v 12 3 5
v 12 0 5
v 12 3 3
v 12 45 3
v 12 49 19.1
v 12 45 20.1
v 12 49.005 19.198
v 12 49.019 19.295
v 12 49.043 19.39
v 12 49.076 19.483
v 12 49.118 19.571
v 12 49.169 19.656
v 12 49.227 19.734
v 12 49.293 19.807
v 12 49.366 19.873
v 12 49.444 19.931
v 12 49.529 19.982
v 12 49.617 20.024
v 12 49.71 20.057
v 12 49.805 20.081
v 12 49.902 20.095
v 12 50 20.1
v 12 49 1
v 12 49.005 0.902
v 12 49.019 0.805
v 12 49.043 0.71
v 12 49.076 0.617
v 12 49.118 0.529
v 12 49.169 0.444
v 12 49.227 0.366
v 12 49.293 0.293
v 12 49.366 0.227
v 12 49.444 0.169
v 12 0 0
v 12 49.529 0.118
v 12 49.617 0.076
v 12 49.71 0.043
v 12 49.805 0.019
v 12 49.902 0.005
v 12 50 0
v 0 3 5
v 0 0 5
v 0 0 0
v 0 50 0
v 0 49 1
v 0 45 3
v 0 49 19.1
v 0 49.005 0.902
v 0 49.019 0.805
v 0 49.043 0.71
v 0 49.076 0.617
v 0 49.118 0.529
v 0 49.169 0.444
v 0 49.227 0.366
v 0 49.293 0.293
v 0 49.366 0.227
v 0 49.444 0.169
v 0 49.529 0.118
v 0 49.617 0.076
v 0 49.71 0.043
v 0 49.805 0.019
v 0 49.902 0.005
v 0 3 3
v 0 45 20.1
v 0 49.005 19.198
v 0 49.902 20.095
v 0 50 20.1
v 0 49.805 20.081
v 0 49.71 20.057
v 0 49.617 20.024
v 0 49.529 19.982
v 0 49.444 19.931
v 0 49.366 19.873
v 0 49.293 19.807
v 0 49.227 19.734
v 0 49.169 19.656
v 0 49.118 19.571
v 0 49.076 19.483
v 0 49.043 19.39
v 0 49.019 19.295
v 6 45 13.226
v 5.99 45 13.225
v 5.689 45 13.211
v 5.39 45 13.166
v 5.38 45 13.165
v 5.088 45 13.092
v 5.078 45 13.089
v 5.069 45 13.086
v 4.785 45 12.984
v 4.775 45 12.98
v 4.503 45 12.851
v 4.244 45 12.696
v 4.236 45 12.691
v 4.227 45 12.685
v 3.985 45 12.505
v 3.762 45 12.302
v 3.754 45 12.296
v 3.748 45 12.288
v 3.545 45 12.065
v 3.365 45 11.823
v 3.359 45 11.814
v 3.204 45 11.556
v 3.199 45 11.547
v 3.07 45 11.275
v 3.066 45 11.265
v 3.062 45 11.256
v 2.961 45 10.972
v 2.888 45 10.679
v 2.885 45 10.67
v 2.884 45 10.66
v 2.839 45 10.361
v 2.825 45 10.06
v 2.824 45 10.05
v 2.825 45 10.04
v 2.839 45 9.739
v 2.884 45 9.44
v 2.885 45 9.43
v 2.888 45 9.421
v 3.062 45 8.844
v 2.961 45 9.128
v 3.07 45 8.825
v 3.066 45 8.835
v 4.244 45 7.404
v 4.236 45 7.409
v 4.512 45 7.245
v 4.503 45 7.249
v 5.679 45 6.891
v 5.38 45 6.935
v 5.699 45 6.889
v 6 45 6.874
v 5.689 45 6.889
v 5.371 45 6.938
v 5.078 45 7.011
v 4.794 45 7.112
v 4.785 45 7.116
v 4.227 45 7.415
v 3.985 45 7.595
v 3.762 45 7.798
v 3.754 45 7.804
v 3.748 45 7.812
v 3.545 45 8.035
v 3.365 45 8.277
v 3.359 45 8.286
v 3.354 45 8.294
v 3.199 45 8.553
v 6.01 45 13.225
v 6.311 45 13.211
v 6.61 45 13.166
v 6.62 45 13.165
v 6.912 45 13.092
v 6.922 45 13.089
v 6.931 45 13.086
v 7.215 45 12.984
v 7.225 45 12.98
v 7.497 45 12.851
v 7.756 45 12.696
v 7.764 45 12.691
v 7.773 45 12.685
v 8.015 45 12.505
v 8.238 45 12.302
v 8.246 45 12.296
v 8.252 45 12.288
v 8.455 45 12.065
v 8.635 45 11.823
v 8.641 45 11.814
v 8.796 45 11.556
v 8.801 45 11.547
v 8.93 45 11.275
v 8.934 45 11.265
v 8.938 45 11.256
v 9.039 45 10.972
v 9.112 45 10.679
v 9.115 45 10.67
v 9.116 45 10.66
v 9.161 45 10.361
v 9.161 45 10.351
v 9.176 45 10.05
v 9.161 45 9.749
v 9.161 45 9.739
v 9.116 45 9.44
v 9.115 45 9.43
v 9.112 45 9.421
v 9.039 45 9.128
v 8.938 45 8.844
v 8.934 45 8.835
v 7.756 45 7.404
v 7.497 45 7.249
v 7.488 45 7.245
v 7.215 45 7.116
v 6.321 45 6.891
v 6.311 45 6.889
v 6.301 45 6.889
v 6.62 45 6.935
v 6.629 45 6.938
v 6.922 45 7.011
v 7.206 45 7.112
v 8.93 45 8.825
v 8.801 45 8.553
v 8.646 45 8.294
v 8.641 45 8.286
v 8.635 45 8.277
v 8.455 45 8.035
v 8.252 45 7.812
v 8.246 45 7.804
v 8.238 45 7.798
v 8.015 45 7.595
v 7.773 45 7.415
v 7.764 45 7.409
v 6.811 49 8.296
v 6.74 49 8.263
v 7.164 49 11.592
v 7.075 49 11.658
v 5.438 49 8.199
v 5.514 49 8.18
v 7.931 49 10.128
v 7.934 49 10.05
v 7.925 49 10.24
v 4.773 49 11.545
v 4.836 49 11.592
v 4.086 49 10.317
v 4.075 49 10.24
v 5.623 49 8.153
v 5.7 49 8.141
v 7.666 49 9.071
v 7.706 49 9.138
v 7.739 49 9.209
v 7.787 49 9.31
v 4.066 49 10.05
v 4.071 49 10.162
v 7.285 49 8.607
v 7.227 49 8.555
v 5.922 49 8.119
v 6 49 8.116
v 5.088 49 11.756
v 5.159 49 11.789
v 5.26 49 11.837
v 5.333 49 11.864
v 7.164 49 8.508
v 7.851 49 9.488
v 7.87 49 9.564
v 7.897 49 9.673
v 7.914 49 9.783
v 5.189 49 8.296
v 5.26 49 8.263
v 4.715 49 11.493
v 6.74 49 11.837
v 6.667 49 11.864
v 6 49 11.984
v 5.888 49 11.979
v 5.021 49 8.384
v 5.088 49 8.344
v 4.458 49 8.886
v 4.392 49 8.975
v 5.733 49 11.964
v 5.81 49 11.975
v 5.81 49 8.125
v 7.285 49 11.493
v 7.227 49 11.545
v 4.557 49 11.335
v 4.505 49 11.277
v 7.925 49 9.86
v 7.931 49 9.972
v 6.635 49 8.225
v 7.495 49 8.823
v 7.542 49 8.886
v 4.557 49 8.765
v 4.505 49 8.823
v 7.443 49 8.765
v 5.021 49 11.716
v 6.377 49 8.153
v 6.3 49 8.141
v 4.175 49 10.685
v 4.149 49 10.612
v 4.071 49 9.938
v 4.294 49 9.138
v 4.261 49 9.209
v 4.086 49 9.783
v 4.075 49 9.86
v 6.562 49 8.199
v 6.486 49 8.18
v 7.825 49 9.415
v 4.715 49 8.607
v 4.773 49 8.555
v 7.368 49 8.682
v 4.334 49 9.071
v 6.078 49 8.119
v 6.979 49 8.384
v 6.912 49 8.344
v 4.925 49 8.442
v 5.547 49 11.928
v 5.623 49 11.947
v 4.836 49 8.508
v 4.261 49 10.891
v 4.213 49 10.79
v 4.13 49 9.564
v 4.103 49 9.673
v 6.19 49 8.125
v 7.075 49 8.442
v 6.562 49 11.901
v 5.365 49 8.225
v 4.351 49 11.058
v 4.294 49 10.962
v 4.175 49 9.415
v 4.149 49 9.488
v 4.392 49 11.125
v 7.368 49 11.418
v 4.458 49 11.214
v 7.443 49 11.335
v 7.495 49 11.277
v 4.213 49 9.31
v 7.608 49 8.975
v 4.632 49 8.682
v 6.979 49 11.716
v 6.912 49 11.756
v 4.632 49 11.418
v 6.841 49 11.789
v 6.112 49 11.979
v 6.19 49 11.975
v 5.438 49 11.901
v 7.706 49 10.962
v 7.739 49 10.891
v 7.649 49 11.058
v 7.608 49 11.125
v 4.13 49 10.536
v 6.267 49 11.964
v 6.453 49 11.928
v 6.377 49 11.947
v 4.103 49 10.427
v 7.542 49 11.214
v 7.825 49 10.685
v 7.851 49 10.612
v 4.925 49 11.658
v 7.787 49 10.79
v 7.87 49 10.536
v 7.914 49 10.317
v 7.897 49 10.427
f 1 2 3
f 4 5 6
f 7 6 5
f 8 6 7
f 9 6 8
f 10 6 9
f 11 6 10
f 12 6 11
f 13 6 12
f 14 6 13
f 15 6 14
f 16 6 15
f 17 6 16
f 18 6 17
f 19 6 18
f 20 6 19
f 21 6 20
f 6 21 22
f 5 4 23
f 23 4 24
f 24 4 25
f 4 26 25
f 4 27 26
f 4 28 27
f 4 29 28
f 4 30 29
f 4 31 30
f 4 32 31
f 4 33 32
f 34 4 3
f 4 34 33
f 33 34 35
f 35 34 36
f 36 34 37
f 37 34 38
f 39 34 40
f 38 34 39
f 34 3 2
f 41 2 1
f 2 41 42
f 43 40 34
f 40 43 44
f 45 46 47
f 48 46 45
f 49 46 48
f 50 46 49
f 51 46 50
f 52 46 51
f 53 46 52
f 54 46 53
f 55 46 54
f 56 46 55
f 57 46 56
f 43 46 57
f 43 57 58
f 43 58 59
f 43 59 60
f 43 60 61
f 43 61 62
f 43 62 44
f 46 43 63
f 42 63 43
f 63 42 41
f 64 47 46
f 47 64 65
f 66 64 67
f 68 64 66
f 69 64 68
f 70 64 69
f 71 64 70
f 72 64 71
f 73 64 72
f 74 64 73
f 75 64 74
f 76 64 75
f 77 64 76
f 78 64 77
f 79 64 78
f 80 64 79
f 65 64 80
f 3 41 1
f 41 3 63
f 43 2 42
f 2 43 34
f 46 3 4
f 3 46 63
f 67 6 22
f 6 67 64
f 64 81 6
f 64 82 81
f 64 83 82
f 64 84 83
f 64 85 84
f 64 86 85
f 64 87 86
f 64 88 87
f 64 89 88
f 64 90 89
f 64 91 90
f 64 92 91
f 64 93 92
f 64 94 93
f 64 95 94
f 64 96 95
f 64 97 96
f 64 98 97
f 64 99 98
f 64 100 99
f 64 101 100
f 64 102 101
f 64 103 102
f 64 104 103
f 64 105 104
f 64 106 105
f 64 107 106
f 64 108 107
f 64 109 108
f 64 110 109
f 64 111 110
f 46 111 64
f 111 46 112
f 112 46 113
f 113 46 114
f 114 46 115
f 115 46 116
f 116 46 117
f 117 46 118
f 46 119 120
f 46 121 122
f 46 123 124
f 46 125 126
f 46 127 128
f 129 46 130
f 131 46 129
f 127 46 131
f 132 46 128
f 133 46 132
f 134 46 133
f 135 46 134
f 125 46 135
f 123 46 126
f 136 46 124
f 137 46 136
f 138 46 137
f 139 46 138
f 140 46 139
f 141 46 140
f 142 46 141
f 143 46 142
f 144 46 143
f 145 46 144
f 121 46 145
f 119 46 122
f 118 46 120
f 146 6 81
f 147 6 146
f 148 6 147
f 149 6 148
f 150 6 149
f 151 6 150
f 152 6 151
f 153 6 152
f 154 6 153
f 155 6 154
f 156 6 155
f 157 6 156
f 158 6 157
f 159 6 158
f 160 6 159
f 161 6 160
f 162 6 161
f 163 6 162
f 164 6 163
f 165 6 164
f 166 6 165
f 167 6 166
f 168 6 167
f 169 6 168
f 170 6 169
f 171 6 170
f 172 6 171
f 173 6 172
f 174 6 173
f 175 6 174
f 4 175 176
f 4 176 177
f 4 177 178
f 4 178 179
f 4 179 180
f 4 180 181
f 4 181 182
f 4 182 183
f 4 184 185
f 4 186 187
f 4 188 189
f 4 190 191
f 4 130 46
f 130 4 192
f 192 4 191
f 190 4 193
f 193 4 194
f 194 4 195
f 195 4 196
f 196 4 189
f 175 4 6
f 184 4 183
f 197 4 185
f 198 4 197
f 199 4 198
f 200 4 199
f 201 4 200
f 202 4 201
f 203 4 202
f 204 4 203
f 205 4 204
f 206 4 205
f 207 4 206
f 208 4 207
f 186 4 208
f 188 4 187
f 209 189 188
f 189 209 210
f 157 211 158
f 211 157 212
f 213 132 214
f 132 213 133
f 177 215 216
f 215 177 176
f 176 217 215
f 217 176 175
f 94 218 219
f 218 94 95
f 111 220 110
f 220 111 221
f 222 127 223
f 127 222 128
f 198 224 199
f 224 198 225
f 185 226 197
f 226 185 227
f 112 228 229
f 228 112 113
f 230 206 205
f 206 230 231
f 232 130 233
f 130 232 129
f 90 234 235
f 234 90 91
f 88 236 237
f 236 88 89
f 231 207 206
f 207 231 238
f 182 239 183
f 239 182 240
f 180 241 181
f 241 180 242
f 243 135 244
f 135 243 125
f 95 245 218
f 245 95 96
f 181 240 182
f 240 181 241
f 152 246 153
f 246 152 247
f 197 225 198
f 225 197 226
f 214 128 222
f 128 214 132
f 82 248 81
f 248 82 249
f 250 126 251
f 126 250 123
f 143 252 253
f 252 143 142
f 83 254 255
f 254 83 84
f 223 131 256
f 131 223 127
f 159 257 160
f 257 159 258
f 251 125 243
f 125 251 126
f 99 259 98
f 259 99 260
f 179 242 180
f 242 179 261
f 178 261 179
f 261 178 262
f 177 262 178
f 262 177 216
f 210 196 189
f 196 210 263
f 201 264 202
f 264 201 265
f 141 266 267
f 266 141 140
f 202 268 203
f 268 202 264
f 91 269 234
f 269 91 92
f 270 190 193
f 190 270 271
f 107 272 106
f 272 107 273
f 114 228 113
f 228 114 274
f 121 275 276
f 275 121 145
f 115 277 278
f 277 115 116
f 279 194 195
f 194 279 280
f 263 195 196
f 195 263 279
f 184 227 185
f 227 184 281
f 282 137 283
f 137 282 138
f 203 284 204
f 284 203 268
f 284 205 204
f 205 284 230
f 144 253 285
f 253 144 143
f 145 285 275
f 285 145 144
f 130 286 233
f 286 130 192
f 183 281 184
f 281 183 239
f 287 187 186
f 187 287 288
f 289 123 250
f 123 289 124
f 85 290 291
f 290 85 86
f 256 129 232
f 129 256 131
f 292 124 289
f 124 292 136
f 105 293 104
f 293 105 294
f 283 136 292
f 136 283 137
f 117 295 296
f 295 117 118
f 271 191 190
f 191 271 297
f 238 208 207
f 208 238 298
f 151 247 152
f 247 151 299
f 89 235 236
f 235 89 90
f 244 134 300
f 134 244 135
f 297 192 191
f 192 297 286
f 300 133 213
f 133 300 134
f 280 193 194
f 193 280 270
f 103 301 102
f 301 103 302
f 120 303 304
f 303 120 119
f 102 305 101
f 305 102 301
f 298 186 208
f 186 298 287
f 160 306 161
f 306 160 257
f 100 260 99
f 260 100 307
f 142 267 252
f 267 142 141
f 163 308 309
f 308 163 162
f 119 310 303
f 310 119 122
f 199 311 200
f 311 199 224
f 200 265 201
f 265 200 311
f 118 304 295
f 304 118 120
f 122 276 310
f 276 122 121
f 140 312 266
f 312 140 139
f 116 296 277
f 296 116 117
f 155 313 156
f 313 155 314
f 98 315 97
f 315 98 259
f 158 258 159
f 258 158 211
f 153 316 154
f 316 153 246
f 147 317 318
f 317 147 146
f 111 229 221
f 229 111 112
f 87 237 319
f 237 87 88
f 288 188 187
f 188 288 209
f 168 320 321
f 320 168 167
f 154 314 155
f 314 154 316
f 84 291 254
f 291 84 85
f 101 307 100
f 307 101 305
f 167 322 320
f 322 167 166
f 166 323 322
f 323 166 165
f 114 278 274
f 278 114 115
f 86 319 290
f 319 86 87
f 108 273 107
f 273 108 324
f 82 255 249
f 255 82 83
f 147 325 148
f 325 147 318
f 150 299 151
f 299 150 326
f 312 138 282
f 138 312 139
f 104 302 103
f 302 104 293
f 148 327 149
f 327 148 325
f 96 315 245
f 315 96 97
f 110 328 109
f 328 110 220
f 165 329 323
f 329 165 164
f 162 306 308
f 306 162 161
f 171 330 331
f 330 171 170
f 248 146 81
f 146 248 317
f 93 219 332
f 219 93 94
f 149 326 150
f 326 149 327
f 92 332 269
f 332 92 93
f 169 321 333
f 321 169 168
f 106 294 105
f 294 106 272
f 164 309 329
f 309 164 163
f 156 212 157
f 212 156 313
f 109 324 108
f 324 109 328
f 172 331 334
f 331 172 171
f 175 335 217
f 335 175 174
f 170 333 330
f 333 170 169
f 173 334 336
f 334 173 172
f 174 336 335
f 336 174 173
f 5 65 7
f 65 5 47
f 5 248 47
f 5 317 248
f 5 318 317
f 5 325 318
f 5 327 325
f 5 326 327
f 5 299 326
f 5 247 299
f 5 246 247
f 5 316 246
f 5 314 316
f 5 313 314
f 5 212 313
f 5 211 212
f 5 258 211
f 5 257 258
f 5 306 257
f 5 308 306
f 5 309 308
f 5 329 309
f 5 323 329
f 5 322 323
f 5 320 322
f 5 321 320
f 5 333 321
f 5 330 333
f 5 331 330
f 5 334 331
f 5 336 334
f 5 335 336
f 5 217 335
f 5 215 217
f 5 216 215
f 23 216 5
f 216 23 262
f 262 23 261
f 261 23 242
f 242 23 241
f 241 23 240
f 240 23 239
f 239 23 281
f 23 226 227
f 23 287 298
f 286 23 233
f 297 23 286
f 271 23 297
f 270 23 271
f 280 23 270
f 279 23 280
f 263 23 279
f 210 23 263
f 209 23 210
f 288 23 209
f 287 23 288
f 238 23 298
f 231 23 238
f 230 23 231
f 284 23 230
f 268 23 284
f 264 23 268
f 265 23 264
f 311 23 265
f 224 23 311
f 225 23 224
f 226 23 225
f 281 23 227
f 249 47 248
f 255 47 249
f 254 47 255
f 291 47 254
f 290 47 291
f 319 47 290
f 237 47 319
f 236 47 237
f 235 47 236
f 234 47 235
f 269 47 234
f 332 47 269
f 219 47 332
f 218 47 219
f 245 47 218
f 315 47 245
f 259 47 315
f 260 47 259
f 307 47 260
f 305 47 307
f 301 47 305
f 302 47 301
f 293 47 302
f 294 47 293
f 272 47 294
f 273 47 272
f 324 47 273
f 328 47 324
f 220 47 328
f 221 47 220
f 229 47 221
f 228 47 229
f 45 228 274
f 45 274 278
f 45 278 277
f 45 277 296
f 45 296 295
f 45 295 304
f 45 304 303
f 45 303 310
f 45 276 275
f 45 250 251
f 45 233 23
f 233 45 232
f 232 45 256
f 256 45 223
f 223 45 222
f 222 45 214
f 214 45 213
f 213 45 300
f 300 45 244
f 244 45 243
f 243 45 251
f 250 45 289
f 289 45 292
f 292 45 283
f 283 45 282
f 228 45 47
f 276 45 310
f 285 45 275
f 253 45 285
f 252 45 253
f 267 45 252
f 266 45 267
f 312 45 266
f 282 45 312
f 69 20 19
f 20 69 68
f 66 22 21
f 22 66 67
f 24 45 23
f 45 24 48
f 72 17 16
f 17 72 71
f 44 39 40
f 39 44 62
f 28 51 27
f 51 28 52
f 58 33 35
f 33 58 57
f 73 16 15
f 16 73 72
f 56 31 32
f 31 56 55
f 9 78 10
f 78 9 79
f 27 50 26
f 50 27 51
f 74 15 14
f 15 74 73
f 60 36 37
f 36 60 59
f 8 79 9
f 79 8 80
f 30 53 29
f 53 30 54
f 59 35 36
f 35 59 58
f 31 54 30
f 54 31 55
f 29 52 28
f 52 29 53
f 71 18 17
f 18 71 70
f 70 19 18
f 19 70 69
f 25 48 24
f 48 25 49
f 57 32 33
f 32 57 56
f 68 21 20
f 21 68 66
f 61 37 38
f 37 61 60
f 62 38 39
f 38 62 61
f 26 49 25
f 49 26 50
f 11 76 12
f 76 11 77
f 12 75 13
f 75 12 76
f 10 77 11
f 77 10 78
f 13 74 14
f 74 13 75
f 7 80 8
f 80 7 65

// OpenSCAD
width = 12;
length = 50;
height = 20.1;
wall = 3;
wall_back = 5;
diameter1 = 3;
diameter2 = 6.6;
clearance = 0.4;
pin_length = 5;
pin_diameter = 4;
border_radius = 1;

// back
difference() {

    union() {
        // front
        cube ([width, wall, 5]);

        // bottom
        cube ([width, length, wall]);

        // back
        translate ([0, length-wall_back, 0]) cube ([width, wall_back, height]);
    }
    
    // screw hole
    translate ([width/2, length+clearance, height/2]) {
        rotate (90, [1,0,0])
            cylinder (d1=diameter1, d2=diameter2, h=wall_back+2*clearance, $fn=64);
    }
    translate ([0, 0, 0]) {
        rotate (90, [0,1,0]) {
            hull() {
                translate ([-border_radius, length, -clearance]) {
                    cylinder (r=border_radius, h=width+2*clearance, $fn=64);
                }
                translate ([-height+border_radius, length, -clearance]) {
                    cylinder (r=border_radius, h=width+2*clearance, $fn=64);
                }
            }
        }
    }
}

// pin
/*
translate ([width/2, length, 0]) {
    rotate (-90, [1,0,0]) {
        difference() {
            cylinder (d=pin_diameter, h=pin_length, $fn=64);
            translate ([-pin_diameter/2, 0, 0])
                cube ([pin_diameter,pin_diameter,pin_length]);
        }
    }
}
*/
